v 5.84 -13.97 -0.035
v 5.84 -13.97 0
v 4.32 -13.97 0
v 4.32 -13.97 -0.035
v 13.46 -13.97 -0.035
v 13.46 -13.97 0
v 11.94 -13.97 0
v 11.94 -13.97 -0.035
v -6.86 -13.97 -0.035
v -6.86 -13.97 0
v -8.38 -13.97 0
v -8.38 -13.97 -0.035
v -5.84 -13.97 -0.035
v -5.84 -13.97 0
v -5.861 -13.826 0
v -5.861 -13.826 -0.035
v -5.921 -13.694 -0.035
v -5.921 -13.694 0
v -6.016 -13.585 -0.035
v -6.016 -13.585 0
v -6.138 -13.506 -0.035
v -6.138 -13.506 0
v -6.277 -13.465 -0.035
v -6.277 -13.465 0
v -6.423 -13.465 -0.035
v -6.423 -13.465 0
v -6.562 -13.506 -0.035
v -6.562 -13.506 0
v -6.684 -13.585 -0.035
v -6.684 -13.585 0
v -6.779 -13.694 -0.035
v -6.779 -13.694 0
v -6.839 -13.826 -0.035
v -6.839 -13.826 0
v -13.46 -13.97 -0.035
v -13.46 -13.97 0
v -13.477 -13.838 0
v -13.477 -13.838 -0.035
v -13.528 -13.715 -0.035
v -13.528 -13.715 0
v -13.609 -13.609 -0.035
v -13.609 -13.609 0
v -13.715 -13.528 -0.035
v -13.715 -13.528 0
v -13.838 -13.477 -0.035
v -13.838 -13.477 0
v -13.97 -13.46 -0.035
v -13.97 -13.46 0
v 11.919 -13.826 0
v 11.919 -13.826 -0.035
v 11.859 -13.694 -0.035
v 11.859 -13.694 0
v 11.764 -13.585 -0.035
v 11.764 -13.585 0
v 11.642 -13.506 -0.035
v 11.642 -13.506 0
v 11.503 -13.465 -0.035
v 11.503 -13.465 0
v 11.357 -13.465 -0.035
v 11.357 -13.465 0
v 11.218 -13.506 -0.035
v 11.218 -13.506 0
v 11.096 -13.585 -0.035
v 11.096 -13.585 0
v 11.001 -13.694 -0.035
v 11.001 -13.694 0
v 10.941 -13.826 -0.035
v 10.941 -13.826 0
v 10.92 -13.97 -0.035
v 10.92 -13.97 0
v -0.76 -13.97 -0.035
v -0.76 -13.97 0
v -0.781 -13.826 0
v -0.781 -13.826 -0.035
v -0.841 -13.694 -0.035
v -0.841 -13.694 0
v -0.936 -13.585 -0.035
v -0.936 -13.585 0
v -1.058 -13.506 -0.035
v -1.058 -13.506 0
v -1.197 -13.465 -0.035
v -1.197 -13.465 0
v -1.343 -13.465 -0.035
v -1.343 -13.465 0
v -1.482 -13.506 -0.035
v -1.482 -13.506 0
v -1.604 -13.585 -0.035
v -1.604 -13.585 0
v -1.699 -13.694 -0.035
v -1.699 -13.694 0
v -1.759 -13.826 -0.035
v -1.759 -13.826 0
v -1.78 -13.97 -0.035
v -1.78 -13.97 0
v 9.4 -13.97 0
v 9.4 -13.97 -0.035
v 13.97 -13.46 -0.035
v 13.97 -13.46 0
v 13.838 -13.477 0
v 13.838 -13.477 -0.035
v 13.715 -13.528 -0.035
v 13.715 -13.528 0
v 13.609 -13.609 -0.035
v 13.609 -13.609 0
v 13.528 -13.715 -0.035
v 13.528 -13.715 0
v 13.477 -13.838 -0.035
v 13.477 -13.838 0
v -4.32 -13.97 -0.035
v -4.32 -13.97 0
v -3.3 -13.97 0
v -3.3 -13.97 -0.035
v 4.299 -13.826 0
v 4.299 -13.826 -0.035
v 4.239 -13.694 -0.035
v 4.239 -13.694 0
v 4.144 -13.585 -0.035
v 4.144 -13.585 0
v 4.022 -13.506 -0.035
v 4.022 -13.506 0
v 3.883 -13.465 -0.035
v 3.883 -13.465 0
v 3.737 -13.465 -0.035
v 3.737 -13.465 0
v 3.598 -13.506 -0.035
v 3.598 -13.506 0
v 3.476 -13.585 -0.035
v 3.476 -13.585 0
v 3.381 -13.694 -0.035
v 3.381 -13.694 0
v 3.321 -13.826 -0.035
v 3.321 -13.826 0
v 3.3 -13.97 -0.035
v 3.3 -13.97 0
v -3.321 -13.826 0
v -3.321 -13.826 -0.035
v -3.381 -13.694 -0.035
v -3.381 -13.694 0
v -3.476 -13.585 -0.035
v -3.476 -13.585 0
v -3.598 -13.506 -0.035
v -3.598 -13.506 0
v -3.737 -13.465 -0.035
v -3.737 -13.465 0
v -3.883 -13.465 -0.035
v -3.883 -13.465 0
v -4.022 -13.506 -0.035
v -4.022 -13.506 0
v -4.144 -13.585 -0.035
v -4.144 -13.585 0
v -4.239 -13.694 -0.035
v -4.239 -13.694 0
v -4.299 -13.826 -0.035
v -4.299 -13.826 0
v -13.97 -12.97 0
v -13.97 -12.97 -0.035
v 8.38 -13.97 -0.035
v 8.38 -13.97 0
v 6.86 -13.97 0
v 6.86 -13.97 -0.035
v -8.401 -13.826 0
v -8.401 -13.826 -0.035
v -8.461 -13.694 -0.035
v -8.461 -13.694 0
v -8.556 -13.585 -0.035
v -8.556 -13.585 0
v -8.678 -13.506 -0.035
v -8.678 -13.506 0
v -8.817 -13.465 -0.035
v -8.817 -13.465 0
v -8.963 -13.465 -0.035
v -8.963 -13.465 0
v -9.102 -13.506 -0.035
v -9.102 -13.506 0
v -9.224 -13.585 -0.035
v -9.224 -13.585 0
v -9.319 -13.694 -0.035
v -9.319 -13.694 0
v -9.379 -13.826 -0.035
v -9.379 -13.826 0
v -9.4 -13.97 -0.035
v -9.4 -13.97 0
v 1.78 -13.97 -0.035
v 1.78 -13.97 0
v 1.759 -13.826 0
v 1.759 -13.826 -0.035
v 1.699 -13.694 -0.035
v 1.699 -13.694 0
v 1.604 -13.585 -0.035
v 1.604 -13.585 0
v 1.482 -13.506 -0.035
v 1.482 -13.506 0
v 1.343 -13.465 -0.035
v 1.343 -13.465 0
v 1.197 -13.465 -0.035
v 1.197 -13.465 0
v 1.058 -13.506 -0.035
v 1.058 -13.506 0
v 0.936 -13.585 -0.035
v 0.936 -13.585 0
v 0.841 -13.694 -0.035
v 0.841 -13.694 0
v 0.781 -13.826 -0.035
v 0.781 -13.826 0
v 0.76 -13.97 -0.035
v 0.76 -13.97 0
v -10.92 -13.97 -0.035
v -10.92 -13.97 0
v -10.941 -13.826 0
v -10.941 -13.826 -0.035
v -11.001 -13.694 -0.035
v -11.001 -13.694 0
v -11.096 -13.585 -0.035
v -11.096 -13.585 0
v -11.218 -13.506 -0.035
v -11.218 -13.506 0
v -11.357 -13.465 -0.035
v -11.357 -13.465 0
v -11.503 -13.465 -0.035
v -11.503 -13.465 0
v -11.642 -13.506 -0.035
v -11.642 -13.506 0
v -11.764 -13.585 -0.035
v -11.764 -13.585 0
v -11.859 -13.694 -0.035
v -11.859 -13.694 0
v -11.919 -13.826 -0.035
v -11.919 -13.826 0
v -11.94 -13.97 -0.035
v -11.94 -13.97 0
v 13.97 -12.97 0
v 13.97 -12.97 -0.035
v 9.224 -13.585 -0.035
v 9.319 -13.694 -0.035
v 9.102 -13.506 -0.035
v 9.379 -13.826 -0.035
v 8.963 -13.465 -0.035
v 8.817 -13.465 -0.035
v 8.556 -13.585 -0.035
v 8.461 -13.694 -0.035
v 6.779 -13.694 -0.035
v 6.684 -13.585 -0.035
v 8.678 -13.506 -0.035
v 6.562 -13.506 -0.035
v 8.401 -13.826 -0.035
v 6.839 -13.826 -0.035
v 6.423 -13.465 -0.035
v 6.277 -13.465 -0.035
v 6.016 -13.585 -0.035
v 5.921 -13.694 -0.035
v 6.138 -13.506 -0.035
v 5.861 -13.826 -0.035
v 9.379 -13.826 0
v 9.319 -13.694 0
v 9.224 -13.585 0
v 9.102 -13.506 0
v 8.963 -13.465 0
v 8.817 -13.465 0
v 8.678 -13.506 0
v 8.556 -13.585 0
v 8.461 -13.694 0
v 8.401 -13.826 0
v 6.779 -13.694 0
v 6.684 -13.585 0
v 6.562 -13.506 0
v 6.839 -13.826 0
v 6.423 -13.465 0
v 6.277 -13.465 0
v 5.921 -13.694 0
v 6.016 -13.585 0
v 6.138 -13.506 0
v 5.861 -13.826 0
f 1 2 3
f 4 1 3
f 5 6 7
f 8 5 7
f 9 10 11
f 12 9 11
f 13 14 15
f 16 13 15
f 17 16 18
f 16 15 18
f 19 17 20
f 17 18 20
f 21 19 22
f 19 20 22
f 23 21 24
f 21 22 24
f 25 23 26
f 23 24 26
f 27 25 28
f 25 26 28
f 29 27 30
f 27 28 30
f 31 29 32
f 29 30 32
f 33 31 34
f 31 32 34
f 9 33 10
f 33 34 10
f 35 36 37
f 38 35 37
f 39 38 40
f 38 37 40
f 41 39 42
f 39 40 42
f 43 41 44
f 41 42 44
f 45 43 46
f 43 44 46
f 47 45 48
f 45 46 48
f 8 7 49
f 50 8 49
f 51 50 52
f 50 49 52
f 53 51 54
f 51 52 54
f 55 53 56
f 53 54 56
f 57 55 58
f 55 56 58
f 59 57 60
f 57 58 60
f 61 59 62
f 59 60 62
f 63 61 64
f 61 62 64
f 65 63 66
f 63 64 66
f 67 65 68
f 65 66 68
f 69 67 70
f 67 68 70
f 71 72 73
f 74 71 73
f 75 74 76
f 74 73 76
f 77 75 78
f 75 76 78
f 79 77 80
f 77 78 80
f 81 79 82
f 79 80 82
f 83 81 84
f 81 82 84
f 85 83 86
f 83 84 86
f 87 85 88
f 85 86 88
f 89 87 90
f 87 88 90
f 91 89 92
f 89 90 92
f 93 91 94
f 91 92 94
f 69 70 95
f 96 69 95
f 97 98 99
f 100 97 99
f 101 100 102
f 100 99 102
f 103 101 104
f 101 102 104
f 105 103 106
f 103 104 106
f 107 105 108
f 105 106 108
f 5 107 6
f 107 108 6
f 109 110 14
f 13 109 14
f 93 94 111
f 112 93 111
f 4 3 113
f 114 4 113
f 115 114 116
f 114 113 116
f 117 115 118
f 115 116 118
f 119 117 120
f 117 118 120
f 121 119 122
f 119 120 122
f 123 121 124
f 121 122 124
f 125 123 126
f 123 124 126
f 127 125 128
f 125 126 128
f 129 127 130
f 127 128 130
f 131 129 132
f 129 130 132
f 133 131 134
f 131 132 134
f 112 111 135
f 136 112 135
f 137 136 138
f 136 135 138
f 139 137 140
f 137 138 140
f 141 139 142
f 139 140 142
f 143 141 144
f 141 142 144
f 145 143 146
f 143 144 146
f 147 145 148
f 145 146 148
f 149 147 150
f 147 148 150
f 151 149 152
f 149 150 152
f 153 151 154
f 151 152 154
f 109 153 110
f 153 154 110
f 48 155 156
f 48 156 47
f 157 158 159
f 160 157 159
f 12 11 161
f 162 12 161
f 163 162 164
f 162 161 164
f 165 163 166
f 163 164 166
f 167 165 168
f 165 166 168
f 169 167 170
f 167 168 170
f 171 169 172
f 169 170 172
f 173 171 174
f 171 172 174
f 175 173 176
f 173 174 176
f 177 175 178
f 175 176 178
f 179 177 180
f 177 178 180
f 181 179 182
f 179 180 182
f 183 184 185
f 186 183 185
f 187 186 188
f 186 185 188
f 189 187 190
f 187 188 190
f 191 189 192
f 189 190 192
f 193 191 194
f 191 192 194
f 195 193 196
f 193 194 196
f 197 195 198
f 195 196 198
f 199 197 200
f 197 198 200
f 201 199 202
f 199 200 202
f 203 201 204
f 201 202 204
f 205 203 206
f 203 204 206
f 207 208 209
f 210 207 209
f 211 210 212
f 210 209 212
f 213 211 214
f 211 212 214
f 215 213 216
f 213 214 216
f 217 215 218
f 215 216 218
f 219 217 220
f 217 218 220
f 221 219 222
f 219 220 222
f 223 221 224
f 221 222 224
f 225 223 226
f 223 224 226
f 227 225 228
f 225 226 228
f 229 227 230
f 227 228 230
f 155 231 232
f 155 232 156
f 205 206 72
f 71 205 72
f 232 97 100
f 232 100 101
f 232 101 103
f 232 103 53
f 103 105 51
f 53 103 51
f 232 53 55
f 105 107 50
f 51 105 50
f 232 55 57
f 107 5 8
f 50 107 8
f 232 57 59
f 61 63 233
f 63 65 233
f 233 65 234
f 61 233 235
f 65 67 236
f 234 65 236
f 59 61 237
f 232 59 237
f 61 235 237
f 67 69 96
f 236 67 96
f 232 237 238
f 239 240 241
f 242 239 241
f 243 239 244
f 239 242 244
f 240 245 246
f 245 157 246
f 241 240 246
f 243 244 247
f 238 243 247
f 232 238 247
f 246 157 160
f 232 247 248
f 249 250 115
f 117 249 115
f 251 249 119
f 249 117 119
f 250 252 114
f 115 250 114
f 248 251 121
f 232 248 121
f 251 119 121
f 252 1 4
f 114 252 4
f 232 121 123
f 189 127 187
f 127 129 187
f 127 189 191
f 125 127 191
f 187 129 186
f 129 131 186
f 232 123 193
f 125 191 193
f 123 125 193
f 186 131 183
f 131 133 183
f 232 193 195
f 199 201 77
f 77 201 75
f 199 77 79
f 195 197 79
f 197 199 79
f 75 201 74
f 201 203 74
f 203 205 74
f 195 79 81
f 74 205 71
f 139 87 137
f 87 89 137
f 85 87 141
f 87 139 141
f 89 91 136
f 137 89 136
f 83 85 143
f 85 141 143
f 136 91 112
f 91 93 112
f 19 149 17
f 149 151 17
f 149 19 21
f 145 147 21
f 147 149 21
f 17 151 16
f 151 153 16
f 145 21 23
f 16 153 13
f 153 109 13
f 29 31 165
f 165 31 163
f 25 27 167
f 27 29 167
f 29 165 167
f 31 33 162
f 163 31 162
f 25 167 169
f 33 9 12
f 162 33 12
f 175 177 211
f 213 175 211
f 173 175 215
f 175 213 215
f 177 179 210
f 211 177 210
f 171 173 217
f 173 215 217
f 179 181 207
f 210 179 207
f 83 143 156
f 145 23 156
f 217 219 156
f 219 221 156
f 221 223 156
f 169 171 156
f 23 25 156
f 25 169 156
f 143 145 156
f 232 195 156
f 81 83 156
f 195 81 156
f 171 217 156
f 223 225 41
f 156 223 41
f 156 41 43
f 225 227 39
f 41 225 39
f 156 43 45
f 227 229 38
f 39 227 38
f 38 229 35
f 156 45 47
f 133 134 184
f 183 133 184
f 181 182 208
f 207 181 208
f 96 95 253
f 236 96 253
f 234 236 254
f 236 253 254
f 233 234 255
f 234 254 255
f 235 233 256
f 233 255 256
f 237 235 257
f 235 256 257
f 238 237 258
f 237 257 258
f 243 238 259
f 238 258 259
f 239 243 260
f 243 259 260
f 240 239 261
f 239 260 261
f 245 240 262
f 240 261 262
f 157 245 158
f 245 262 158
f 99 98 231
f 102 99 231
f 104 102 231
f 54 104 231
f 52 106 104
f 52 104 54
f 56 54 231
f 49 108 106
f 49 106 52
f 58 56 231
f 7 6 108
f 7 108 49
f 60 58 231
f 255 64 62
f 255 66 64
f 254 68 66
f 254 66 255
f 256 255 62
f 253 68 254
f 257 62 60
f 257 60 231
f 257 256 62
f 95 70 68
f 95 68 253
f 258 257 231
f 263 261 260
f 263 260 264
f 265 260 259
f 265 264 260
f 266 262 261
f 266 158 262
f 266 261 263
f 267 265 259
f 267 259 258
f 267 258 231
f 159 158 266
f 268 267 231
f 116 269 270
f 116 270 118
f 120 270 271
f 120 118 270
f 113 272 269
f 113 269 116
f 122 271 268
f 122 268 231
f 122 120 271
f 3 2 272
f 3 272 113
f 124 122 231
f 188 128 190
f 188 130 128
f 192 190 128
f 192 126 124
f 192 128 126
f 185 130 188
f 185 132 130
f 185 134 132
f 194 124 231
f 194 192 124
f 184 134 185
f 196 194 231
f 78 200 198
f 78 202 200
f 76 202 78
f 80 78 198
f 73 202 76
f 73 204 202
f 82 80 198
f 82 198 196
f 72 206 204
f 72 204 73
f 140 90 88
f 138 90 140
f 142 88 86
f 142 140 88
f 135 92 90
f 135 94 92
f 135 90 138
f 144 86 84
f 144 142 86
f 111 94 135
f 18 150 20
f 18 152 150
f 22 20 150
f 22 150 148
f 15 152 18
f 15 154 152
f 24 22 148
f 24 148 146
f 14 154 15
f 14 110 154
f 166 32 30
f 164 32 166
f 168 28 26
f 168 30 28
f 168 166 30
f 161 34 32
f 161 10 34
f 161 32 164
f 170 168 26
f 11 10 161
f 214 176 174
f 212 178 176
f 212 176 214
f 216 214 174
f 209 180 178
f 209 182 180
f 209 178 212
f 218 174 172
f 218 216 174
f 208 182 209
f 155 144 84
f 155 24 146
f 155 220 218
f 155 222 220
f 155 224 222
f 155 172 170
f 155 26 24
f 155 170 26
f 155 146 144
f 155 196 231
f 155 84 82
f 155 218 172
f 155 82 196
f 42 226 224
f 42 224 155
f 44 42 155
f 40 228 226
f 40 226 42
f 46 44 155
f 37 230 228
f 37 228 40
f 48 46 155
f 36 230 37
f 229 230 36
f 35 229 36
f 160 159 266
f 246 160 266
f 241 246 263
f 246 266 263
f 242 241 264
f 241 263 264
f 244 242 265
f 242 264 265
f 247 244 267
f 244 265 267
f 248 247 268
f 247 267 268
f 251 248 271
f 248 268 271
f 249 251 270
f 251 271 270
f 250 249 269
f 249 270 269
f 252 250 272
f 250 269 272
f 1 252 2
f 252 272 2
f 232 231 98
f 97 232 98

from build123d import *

# Parameters (mm, degrees)
SKETCH004_W             = 27.94
SKETCH004_H             = 1
PAD002_DEPTH            = 0.035
SKETCH005_R             = 0.51
POCKET002_DEPTH         = 0.036
LINEARPATTERN005_COUNT  = 12
LINEARPATTERN005_PITCH  = 2.54
BODY004_PLACEMENT_ANGLE = 180


with BuildPart() as part:
    # Sketch004 → Pad002 (new body)
    with BuildSketch(Plane.XY):
        with Locations((0, 13.47)):
            Rectangle(SKETCH004_W, SKETCH004_H)
    extrude(amount=-PAD002_DEPTH)

    # Sketch005 → Pocket002 (cut, through all)
    with BuildSketch(Plane.XY):
        with Locations((-13.97, 13.97)):
            Circle(SKETCH005_R)
    pocket002 = extrude(amount=-POCKET002_DEPTH, mode=Mode.SUBTRACT)

    # LinearPattern005: Pocket002 ×12
    with Locations(*[(i * LINEARPATTERN005_PITCH, 0, 0) for i in range(1, LINEARPATTERN005_COUNT)]):
        add(pocket002, mode=Mode.SUBTRACT)


with BuildPart() as part_1:
    # Body004 placement: moved
    add(part.part.rotate(Axis((0, 0, 0), (0, 0, 1)), BODY004_PLACEMENT_ANGLE))


solid = part_1.part
